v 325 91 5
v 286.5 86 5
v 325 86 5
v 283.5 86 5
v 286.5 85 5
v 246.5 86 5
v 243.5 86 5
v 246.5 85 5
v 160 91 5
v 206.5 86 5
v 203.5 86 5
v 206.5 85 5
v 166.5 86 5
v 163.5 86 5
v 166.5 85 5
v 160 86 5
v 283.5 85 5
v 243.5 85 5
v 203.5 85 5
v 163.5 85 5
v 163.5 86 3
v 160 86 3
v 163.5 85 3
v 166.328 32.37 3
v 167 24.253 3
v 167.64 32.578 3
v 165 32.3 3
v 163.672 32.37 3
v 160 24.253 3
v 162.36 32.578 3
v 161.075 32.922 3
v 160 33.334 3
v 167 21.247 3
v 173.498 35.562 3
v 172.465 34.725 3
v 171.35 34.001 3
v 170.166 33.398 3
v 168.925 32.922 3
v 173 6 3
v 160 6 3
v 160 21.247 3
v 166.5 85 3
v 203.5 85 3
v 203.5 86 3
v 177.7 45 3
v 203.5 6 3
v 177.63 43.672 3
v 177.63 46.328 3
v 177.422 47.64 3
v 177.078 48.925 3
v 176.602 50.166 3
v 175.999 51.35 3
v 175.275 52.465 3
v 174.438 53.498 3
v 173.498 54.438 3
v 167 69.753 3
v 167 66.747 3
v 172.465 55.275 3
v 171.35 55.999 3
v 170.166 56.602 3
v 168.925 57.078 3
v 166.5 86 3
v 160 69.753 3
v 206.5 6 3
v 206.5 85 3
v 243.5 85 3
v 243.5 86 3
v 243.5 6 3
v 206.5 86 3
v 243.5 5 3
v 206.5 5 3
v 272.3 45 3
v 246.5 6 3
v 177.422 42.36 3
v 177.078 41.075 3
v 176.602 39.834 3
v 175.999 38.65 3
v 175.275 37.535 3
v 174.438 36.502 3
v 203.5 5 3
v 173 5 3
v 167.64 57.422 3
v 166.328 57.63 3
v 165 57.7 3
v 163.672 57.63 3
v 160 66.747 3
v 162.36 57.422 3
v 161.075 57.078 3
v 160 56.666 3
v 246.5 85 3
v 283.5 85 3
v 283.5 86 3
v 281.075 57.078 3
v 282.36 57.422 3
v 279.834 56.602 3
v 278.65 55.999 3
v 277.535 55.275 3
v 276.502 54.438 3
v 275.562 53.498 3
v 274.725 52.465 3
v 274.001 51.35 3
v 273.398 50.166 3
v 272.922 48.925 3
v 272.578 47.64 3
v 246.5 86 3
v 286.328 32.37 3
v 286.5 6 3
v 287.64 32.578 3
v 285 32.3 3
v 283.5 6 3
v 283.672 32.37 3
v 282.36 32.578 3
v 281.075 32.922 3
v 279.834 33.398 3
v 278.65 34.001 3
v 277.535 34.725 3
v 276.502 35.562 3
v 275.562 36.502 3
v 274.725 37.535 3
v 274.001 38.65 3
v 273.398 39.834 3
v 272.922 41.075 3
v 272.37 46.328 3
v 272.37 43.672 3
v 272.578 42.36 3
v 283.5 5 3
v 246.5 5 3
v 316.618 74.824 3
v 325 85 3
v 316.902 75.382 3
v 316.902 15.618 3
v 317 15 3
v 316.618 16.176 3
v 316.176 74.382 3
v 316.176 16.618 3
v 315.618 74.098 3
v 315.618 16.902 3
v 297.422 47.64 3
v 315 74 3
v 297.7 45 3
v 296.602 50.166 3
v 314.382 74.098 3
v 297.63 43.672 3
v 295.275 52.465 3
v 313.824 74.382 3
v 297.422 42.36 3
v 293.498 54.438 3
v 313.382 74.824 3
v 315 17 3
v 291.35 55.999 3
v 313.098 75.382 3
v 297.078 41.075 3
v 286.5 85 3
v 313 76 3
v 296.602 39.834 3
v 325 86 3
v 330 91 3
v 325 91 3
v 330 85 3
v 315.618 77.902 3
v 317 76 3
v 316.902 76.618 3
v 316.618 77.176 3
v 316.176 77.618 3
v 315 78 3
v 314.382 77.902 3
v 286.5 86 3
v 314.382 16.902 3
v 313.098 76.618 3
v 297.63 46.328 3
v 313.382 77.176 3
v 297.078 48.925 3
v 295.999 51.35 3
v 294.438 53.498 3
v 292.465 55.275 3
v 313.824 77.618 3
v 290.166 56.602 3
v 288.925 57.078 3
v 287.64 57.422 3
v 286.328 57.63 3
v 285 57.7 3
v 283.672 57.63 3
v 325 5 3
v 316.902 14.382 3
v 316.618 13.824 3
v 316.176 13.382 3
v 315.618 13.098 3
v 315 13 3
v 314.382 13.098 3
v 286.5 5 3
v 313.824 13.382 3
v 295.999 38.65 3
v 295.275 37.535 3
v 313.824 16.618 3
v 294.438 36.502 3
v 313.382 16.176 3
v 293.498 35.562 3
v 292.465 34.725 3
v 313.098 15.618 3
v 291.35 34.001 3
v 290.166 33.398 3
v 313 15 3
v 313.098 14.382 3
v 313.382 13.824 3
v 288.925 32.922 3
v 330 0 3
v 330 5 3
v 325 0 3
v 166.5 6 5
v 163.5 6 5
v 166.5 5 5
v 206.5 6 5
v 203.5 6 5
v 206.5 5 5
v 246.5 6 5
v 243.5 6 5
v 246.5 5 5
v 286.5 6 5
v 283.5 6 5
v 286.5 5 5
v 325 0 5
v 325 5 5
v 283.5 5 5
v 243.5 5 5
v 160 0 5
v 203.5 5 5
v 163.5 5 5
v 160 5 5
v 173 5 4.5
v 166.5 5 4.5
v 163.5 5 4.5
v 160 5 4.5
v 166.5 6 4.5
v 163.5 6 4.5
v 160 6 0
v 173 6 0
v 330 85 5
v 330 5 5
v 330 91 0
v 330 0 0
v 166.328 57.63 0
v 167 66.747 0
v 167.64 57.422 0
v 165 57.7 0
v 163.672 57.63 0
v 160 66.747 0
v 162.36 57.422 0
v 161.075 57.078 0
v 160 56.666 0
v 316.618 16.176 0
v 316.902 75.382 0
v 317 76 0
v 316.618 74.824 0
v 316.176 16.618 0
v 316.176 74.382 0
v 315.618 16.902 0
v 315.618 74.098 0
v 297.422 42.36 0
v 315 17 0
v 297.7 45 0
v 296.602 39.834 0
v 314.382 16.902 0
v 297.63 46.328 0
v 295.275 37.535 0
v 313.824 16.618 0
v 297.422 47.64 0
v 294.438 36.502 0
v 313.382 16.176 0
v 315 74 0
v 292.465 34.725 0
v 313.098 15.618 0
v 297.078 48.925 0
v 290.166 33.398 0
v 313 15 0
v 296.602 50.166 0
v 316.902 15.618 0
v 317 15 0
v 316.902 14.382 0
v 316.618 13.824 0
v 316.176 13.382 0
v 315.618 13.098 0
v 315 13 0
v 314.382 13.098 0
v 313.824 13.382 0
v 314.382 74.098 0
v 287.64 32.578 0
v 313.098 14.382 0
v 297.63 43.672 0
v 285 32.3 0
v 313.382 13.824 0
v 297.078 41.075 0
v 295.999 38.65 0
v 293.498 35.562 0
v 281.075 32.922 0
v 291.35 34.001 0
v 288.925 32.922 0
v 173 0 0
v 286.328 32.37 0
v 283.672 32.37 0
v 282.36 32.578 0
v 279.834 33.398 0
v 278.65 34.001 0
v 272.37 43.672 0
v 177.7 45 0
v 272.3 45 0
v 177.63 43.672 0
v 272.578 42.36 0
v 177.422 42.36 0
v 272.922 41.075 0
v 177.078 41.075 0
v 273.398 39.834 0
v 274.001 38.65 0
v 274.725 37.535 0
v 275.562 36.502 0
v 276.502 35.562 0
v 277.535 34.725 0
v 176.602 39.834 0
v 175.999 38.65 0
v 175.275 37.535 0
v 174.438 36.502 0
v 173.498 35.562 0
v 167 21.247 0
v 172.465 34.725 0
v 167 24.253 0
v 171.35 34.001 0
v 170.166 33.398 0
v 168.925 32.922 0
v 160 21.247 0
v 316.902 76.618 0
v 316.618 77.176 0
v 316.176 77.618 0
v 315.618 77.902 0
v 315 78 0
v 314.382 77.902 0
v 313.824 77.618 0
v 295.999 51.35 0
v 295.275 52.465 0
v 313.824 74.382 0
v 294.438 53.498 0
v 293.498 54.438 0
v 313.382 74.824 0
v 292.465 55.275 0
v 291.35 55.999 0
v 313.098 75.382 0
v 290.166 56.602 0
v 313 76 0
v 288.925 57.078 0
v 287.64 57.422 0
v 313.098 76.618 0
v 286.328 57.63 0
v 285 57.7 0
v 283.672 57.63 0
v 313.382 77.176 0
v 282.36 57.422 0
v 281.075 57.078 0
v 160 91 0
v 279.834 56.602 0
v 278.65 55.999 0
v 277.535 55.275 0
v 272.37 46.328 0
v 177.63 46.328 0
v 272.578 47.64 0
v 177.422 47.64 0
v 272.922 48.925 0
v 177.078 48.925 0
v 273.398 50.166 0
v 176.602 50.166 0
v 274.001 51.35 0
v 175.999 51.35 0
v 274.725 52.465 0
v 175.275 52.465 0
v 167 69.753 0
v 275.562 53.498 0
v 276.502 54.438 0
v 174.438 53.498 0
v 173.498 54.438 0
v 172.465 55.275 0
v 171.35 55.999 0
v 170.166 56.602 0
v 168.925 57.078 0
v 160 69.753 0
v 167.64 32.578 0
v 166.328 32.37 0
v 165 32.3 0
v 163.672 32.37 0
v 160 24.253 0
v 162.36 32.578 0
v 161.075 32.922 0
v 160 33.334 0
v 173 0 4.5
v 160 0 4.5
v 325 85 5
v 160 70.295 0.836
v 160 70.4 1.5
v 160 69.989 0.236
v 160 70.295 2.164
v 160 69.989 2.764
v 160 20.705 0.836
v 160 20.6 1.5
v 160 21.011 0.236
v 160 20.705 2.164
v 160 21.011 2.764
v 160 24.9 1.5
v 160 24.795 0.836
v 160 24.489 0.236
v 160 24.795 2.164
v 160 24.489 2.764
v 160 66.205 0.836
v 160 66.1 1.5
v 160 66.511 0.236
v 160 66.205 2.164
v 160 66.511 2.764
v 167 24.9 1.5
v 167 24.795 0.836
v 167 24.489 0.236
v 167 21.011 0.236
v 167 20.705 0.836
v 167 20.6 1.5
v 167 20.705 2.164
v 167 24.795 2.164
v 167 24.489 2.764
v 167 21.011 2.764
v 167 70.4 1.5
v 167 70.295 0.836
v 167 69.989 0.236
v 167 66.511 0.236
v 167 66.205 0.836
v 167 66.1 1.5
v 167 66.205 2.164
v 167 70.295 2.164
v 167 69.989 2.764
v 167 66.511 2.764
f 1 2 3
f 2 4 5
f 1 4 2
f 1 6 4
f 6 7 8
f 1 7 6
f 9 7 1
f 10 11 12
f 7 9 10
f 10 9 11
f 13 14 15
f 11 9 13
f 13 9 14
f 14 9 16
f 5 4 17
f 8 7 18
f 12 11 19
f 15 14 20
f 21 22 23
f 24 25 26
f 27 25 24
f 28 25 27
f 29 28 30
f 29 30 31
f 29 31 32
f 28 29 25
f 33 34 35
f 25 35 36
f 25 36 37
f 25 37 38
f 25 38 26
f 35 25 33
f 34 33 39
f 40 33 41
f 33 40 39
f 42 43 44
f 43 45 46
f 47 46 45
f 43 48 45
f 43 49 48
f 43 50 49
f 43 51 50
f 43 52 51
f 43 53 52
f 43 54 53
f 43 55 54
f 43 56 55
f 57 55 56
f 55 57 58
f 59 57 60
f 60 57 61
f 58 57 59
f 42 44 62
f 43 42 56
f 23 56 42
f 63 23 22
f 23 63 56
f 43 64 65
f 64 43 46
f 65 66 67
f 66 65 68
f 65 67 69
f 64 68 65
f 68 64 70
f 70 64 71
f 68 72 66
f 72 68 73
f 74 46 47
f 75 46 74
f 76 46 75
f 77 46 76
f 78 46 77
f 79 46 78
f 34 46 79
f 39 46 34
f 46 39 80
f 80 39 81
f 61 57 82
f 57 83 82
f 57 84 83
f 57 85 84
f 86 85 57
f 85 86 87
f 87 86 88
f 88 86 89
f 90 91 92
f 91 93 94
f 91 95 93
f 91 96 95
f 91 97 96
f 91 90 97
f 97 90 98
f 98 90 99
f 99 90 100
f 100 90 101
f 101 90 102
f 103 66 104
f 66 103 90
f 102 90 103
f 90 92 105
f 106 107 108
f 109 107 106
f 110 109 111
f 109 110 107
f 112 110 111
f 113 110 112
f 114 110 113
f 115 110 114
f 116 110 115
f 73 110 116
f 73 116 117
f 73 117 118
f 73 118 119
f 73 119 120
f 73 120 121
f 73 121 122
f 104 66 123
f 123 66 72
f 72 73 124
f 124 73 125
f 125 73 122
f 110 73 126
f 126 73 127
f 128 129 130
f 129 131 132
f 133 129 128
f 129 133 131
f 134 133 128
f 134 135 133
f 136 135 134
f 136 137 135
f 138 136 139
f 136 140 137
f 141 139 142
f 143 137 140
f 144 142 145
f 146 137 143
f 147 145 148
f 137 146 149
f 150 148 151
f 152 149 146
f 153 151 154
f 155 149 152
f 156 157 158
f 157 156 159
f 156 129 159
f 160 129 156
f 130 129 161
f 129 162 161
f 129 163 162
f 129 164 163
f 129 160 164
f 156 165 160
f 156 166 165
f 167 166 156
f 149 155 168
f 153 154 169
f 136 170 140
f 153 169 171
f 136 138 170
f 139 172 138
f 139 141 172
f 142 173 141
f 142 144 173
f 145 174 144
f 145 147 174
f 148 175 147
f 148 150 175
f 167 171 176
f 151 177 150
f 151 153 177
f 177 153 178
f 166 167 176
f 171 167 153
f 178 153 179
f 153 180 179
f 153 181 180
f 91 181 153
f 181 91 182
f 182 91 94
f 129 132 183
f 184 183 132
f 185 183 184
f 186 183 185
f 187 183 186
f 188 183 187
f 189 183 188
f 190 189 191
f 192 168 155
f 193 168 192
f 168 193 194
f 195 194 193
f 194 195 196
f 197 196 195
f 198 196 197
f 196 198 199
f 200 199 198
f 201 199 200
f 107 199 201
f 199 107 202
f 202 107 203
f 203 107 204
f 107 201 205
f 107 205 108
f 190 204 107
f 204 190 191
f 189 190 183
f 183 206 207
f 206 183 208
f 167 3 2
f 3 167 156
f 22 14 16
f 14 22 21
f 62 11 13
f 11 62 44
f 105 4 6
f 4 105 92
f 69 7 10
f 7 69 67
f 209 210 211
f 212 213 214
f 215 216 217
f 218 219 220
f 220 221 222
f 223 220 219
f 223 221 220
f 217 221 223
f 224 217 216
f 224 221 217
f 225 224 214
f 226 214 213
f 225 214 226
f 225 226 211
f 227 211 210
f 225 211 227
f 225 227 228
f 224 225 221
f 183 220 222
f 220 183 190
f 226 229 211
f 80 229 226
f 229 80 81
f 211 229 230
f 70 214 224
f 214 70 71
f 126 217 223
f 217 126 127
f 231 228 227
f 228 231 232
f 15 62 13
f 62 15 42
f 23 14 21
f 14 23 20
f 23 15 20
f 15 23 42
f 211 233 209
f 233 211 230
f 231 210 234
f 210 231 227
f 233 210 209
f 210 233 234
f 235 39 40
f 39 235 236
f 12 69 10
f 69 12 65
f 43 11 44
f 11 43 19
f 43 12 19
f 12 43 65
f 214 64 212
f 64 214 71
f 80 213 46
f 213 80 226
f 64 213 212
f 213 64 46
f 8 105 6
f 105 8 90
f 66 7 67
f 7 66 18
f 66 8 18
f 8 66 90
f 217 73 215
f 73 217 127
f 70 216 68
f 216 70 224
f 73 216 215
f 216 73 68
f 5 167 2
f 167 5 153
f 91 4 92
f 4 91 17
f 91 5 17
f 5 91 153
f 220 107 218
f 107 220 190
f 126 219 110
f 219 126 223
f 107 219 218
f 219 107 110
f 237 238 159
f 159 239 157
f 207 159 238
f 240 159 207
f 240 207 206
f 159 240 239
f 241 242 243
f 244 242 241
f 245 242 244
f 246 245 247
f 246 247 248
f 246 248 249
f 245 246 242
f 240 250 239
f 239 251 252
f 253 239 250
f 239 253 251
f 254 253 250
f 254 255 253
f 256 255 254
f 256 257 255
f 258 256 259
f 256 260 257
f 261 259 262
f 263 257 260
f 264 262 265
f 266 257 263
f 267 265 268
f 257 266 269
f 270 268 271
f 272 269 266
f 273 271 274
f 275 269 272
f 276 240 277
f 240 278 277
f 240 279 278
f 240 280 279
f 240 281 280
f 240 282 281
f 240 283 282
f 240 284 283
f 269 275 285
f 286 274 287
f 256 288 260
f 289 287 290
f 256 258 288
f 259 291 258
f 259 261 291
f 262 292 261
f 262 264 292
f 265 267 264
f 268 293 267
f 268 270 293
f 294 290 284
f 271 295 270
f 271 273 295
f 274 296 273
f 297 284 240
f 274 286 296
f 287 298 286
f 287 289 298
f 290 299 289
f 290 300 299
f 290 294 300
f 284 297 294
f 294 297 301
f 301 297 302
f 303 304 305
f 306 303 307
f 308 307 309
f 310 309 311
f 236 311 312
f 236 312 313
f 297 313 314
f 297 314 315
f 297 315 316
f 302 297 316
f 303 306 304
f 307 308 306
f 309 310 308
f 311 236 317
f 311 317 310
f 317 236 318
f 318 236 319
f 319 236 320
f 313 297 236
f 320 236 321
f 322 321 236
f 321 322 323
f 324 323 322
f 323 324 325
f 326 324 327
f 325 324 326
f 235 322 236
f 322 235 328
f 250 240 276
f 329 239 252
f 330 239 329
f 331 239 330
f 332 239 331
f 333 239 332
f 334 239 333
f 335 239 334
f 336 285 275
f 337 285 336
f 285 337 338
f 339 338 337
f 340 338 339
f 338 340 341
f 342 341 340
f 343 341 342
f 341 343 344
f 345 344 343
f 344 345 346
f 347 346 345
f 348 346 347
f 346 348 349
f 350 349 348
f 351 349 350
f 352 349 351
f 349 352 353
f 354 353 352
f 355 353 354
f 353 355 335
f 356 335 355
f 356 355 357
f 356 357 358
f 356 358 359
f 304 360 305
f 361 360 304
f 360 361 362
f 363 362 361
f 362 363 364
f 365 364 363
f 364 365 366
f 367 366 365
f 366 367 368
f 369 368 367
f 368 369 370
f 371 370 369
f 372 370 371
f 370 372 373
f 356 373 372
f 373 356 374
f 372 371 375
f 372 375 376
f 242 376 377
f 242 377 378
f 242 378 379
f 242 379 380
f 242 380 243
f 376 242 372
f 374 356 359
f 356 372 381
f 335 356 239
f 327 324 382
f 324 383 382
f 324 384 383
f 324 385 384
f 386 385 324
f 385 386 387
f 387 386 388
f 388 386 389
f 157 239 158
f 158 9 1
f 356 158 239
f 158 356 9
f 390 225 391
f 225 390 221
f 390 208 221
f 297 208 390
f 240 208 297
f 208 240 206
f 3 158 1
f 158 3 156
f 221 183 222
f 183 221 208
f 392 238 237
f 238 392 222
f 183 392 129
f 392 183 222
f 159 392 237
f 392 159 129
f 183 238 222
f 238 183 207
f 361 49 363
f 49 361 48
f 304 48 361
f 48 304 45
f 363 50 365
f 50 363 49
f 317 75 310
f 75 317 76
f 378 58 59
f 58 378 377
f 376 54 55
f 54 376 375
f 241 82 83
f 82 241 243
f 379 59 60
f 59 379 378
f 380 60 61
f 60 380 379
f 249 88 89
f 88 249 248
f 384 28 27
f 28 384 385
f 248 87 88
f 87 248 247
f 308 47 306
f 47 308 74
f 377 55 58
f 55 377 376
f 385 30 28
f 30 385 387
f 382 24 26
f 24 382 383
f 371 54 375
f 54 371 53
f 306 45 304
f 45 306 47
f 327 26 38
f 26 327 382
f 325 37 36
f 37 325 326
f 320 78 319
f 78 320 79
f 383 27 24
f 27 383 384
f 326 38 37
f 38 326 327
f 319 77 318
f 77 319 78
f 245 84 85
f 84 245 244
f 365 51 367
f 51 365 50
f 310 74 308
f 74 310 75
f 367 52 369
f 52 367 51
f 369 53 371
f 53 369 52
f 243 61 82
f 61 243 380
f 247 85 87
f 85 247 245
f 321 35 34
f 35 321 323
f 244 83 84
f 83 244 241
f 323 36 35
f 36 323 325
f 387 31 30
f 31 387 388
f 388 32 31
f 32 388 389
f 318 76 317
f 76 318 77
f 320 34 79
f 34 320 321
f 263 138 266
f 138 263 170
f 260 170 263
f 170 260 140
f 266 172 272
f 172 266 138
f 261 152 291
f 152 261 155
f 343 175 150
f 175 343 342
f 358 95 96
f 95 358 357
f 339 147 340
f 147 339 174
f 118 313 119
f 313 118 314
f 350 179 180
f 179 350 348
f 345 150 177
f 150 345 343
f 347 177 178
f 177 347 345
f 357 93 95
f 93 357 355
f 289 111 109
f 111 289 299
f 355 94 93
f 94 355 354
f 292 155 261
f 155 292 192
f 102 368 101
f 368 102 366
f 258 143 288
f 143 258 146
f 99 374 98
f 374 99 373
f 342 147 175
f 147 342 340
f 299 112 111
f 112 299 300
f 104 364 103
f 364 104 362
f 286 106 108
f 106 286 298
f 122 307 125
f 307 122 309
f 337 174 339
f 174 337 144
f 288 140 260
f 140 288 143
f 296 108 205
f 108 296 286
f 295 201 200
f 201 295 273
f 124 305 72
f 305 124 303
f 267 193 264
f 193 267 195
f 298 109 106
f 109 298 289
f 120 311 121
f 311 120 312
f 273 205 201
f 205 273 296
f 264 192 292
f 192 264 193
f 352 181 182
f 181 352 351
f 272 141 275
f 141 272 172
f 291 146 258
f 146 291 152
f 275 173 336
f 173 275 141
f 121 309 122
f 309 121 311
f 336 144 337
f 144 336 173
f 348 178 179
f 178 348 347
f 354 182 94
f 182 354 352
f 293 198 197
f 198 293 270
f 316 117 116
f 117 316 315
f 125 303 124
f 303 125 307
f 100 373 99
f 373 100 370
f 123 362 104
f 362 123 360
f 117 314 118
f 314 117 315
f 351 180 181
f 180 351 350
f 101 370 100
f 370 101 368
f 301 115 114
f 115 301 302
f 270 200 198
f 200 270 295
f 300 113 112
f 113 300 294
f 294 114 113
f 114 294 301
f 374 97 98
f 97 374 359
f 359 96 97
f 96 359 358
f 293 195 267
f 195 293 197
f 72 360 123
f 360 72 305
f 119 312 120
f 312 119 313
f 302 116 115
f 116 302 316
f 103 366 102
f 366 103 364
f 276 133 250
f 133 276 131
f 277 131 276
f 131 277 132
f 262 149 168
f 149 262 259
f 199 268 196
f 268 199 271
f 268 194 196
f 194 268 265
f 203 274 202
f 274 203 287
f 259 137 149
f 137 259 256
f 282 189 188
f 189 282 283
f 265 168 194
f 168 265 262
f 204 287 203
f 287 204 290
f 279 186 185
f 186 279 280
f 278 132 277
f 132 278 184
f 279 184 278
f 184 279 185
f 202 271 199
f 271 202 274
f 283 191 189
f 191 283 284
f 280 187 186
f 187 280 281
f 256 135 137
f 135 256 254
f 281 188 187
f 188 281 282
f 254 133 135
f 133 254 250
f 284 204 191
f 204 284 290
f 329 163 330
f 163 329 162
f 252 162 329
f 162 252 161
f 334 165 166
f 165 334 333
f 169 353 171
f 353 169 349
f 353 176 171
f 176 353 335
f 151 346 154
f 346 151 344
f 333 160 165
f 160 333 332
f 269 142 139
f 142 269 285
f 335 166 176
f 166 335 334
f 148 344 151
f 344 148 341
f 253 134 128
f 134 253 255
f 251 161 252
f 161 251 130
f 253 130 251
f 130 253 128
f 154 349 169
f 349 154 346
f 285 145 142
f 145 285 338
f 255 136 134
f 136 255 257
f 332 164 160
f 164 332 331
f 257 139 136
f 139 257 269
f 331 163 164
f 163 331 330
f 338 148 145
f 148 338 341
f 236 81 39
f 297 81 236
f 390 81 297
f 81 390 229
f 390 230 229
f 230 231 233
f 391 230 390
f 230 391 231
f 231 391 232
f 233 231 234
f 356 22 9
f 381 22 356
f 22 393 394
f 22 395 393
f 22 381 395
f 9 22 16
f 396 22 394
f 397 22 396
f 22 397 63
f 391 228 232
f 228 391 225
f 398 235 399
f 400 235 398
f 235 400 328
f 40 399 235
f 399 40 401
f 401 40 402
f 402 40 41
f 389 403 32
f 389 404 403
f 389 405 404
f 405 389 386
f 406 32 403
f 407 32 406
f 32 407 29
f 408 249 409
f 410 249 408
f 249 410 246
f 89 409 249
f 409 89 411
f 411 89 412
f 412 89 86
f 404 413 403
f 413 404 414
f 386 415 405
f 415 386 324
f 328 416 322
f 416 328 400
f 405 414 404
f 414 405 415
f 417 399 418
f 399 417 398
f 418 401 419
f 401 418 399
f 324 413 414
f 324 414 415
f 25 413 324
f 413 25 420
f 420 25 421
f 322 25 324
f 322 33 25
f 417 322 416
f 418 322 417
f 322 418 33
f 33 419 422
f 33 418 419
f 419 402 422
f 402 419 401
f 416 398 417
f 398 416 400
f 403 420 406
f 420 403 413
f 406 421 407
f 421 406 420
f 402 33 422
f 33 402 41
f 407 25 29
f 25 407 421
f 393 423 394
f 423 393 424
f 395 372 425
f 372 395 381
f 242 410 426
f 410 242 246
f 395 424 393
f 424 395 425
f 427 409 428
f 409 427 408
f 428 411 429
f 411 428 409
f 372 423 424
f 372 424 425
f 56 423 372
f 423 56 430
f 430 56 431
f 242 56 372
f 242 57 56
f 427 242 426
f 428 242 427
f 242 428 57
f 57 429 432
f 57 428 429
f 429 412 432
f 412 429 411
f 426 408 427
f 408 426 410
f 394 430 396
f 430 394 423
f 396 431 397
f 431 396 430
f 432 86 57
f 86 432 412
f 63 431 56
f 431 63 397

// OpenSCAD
// EMERGENCY MINIMAL LED PLAQUE - Flat version for quick printing
// 32cm x 8cm flat backing with clips to hold WS2812B LED matrix
// Designed to mount directly to nutcracker or platform

// LED Matrix dimensions (from matrix-dimensions.jpg)
led_matrix_width = 320;     // 32cm = 320mm
led_matrix_height = 80;     // 8cm = 80mm
led_matrix_depth = 2;       // Thin flexible strip

// Plaque parameters
wall_thickness = 2;
border_width = 5;           // Border around LED matrix
clip_size = 3;              // Small clips to hold LEDs
clip_spacing = 40;          // Clip every 40mm

// Cable holes - BIGGER for connectors (1 inch = 25.4mm diameter)
cable_hole_diameter = 25.4;  // 1 inch diameter holes
// Connector positions (from matrix-dimensions.jpg)
// Left: 3PIN Female at ~40mm from left
// Center: Voltage wires at center
// Right: 3PIN Male at ~40mm from right
cable_hole_left_x = 40;      // Left connector position
cable_hole_center_x = led_matrix_width / 2;  // Center voltage wires
cable_hole_right_x = led_matrix_width - 40;  // Right connector position
cable_hole_y = led_matrix_height / 2;        // Centered vertically

// Mounting
mounting_hole_diameter = 4; // For M4 screws to attach to nutcracker
mounting_hole_spacing_x = 280; // Near edges of plaque
mounting_hole_spacing_y = 60;  // Top and bottom

plaque_width = led_matrix_width + border_width * 2;
plaque_height = led_matrix_height + border_width * 2 + 1;  // +1mm extra height
plaque_thickness = 3;

echo("=== FLAT LED PLAQUE DIMENSIONS ===");
echo("Plaque size:", plaque_width, "x", plaque_height, "x", plaque_thickness);
echo("Fits Flashforge AD5X:", plaque_width <= 220 ? "NO - NEED TO SPLIT" : "NO - NEED TO SPLIT");
echo("Will generate in 2 halves for printing");

// === MAIN PLAQUE MODULE ===
module led_plaque_half(is_left=true) {
    half_width = plaque_width / 2 + 5; // Extra for overlap
    
    difference() {
        union() {
            intersection() {
                led_plaque_full();
                
                // Cut plane
                translate([is_left ? -10 : plaque_width/2 - 5, -10, -10])
                    cube([plaque_width/2 + 15, plaque_height + 20, 20]);
            }
            
            // Left half gets PINS (add them)
            if (is_left) {
                for (y = [plaque_height/4, plaque_height/2, 3*plaque_height/4]) {
                    translate([plaque_width/2, y, plaque_thickness/2])
                        rotate([0, 90, 0])
                            cylinder(h = 8, d = 4, $fn=20);
                }
            }
        }
        
        // Right half gets HOLES (subtract them)
        if (!is_left) {
            for (y = [plaque_height/4, plaque_height/2, 3*plaque_height/4]) {
                translate([plaque_width/2 - 8, y, plaque_thickness/2])
                    rotate([0, 90, 0])
                        cylinder(h = 10, d = 4.3, $fn=20);
            }
        }
    }
}

module led_plaque_full() {
    difference() {
        union() {
            // Main plaque backing
            cube([plaque_width, plaque_height, plaque_thickness]);
            
            // Edge walls to hold LED matrix
            // Top wall
            translate([border_width, plaque_height - border_width, 0])
                cube([led_matrix_width, border_width, plaque_thickness + 2]);
            // Bottom wall
            translate([border_width, 0, 0])
                cube([led_matrix_width, border_width, plaque_thickness + 2]);
            // Left wall
            translate([0, border_width, 0])
                cube([border_width, led_matrix_height, plaque_thickness + 2]);
            // Right wall
            translate([plaque_width - border_width, border_width, 0])
                cube([border_width, led_matrix_height, plaque_thickness + 2]);
            
            // Retention clips along top and bottom edges
            num_clips = floor(led_matrix_width / clip_spacing);
            for (i = [1 : num_clips - 1]) {
                x_pos = border_width + i * clip_spacing;
                // Top clips
                translate([x_pos - clip_size/2, plaque_height - border_width - 1, plaque_thickness])
                    cube([clip_size, 1, 2]);
                // Bottom clips
                translate([x_pos - clip_size/2, border_width, plaque_thickness])
                    cube([clip_size, 1, 2]);
            }
        }
        
        // Cable holes for connectors (1 inch diameter, positioned per matrix-dimensions.jpg)
        // Left: 3PIN Female connector
        translate([border_width + cable_hole_left_x, 
                   border_width + cable_hole_y, 
                   -1])
            cylinder(h = plaque_thickness + 2, d = cable_hole_diameter, $fn=60);
        
        // Center: Voltage wires - CLEAN HOLE (no floating center)
        translate([border_width + cable_hole_center_x, 
                   border_width + cable_hole_y, 
                   -1])
            cylinder(h = plaque_thickness + 2, d = cable_hole_diameter, $fn=60);
        
        // Right: 3PIN Male connector
        translate([border_width + cable_hole_right_x, 
                   border_width + cable_hole_y, 
                   -1])
            cylinder(h = plaque_thickness + 2, d = cable_hole_diameter, $fn=60);
        
        // Mounting holes at corners
        translate([border_width + 10, border_width + 10, -1])
            cylinder(h = plaque_thickness + 2, d = mounting_hole_diameter, $fn=20);
        translate([plaque_width - border_width - 10, border_width + 10, -1])
            cylinder(h = plaque_thickness + 2, d = mounting_hole_diameter, $fn=20);
        translate([border_width + 10, plaque_height - border_width - 10, -1])
            cylinder(h = plaque_thickness + 2, d = mounting_hole_diameter, $fn=20);
        translate([plaque_width - border_width - 10, plaque_height - border_width - 10, -1])
            cylinder(h = plaque_thickness + 2, d = mounting_hole_diameter, $fn=20);
        
        // Wire pass-through hole at bottom center
        translate([plaque_width/2 - 8, -1, plaque_thickness/2 - 3])
            cube([16, border_width + 2, 6]);
    }
}

// === RENDER ===
// RENDER ONE HALF AT A TIME!
// Comment/uncomment to choose which half to render

// LEFT HALF ONLY (render this first)
////led_plaque_half(is_left=true);

// RIGHT HALF ONLY (render this second)
led_plaque_half(is_left=false);
